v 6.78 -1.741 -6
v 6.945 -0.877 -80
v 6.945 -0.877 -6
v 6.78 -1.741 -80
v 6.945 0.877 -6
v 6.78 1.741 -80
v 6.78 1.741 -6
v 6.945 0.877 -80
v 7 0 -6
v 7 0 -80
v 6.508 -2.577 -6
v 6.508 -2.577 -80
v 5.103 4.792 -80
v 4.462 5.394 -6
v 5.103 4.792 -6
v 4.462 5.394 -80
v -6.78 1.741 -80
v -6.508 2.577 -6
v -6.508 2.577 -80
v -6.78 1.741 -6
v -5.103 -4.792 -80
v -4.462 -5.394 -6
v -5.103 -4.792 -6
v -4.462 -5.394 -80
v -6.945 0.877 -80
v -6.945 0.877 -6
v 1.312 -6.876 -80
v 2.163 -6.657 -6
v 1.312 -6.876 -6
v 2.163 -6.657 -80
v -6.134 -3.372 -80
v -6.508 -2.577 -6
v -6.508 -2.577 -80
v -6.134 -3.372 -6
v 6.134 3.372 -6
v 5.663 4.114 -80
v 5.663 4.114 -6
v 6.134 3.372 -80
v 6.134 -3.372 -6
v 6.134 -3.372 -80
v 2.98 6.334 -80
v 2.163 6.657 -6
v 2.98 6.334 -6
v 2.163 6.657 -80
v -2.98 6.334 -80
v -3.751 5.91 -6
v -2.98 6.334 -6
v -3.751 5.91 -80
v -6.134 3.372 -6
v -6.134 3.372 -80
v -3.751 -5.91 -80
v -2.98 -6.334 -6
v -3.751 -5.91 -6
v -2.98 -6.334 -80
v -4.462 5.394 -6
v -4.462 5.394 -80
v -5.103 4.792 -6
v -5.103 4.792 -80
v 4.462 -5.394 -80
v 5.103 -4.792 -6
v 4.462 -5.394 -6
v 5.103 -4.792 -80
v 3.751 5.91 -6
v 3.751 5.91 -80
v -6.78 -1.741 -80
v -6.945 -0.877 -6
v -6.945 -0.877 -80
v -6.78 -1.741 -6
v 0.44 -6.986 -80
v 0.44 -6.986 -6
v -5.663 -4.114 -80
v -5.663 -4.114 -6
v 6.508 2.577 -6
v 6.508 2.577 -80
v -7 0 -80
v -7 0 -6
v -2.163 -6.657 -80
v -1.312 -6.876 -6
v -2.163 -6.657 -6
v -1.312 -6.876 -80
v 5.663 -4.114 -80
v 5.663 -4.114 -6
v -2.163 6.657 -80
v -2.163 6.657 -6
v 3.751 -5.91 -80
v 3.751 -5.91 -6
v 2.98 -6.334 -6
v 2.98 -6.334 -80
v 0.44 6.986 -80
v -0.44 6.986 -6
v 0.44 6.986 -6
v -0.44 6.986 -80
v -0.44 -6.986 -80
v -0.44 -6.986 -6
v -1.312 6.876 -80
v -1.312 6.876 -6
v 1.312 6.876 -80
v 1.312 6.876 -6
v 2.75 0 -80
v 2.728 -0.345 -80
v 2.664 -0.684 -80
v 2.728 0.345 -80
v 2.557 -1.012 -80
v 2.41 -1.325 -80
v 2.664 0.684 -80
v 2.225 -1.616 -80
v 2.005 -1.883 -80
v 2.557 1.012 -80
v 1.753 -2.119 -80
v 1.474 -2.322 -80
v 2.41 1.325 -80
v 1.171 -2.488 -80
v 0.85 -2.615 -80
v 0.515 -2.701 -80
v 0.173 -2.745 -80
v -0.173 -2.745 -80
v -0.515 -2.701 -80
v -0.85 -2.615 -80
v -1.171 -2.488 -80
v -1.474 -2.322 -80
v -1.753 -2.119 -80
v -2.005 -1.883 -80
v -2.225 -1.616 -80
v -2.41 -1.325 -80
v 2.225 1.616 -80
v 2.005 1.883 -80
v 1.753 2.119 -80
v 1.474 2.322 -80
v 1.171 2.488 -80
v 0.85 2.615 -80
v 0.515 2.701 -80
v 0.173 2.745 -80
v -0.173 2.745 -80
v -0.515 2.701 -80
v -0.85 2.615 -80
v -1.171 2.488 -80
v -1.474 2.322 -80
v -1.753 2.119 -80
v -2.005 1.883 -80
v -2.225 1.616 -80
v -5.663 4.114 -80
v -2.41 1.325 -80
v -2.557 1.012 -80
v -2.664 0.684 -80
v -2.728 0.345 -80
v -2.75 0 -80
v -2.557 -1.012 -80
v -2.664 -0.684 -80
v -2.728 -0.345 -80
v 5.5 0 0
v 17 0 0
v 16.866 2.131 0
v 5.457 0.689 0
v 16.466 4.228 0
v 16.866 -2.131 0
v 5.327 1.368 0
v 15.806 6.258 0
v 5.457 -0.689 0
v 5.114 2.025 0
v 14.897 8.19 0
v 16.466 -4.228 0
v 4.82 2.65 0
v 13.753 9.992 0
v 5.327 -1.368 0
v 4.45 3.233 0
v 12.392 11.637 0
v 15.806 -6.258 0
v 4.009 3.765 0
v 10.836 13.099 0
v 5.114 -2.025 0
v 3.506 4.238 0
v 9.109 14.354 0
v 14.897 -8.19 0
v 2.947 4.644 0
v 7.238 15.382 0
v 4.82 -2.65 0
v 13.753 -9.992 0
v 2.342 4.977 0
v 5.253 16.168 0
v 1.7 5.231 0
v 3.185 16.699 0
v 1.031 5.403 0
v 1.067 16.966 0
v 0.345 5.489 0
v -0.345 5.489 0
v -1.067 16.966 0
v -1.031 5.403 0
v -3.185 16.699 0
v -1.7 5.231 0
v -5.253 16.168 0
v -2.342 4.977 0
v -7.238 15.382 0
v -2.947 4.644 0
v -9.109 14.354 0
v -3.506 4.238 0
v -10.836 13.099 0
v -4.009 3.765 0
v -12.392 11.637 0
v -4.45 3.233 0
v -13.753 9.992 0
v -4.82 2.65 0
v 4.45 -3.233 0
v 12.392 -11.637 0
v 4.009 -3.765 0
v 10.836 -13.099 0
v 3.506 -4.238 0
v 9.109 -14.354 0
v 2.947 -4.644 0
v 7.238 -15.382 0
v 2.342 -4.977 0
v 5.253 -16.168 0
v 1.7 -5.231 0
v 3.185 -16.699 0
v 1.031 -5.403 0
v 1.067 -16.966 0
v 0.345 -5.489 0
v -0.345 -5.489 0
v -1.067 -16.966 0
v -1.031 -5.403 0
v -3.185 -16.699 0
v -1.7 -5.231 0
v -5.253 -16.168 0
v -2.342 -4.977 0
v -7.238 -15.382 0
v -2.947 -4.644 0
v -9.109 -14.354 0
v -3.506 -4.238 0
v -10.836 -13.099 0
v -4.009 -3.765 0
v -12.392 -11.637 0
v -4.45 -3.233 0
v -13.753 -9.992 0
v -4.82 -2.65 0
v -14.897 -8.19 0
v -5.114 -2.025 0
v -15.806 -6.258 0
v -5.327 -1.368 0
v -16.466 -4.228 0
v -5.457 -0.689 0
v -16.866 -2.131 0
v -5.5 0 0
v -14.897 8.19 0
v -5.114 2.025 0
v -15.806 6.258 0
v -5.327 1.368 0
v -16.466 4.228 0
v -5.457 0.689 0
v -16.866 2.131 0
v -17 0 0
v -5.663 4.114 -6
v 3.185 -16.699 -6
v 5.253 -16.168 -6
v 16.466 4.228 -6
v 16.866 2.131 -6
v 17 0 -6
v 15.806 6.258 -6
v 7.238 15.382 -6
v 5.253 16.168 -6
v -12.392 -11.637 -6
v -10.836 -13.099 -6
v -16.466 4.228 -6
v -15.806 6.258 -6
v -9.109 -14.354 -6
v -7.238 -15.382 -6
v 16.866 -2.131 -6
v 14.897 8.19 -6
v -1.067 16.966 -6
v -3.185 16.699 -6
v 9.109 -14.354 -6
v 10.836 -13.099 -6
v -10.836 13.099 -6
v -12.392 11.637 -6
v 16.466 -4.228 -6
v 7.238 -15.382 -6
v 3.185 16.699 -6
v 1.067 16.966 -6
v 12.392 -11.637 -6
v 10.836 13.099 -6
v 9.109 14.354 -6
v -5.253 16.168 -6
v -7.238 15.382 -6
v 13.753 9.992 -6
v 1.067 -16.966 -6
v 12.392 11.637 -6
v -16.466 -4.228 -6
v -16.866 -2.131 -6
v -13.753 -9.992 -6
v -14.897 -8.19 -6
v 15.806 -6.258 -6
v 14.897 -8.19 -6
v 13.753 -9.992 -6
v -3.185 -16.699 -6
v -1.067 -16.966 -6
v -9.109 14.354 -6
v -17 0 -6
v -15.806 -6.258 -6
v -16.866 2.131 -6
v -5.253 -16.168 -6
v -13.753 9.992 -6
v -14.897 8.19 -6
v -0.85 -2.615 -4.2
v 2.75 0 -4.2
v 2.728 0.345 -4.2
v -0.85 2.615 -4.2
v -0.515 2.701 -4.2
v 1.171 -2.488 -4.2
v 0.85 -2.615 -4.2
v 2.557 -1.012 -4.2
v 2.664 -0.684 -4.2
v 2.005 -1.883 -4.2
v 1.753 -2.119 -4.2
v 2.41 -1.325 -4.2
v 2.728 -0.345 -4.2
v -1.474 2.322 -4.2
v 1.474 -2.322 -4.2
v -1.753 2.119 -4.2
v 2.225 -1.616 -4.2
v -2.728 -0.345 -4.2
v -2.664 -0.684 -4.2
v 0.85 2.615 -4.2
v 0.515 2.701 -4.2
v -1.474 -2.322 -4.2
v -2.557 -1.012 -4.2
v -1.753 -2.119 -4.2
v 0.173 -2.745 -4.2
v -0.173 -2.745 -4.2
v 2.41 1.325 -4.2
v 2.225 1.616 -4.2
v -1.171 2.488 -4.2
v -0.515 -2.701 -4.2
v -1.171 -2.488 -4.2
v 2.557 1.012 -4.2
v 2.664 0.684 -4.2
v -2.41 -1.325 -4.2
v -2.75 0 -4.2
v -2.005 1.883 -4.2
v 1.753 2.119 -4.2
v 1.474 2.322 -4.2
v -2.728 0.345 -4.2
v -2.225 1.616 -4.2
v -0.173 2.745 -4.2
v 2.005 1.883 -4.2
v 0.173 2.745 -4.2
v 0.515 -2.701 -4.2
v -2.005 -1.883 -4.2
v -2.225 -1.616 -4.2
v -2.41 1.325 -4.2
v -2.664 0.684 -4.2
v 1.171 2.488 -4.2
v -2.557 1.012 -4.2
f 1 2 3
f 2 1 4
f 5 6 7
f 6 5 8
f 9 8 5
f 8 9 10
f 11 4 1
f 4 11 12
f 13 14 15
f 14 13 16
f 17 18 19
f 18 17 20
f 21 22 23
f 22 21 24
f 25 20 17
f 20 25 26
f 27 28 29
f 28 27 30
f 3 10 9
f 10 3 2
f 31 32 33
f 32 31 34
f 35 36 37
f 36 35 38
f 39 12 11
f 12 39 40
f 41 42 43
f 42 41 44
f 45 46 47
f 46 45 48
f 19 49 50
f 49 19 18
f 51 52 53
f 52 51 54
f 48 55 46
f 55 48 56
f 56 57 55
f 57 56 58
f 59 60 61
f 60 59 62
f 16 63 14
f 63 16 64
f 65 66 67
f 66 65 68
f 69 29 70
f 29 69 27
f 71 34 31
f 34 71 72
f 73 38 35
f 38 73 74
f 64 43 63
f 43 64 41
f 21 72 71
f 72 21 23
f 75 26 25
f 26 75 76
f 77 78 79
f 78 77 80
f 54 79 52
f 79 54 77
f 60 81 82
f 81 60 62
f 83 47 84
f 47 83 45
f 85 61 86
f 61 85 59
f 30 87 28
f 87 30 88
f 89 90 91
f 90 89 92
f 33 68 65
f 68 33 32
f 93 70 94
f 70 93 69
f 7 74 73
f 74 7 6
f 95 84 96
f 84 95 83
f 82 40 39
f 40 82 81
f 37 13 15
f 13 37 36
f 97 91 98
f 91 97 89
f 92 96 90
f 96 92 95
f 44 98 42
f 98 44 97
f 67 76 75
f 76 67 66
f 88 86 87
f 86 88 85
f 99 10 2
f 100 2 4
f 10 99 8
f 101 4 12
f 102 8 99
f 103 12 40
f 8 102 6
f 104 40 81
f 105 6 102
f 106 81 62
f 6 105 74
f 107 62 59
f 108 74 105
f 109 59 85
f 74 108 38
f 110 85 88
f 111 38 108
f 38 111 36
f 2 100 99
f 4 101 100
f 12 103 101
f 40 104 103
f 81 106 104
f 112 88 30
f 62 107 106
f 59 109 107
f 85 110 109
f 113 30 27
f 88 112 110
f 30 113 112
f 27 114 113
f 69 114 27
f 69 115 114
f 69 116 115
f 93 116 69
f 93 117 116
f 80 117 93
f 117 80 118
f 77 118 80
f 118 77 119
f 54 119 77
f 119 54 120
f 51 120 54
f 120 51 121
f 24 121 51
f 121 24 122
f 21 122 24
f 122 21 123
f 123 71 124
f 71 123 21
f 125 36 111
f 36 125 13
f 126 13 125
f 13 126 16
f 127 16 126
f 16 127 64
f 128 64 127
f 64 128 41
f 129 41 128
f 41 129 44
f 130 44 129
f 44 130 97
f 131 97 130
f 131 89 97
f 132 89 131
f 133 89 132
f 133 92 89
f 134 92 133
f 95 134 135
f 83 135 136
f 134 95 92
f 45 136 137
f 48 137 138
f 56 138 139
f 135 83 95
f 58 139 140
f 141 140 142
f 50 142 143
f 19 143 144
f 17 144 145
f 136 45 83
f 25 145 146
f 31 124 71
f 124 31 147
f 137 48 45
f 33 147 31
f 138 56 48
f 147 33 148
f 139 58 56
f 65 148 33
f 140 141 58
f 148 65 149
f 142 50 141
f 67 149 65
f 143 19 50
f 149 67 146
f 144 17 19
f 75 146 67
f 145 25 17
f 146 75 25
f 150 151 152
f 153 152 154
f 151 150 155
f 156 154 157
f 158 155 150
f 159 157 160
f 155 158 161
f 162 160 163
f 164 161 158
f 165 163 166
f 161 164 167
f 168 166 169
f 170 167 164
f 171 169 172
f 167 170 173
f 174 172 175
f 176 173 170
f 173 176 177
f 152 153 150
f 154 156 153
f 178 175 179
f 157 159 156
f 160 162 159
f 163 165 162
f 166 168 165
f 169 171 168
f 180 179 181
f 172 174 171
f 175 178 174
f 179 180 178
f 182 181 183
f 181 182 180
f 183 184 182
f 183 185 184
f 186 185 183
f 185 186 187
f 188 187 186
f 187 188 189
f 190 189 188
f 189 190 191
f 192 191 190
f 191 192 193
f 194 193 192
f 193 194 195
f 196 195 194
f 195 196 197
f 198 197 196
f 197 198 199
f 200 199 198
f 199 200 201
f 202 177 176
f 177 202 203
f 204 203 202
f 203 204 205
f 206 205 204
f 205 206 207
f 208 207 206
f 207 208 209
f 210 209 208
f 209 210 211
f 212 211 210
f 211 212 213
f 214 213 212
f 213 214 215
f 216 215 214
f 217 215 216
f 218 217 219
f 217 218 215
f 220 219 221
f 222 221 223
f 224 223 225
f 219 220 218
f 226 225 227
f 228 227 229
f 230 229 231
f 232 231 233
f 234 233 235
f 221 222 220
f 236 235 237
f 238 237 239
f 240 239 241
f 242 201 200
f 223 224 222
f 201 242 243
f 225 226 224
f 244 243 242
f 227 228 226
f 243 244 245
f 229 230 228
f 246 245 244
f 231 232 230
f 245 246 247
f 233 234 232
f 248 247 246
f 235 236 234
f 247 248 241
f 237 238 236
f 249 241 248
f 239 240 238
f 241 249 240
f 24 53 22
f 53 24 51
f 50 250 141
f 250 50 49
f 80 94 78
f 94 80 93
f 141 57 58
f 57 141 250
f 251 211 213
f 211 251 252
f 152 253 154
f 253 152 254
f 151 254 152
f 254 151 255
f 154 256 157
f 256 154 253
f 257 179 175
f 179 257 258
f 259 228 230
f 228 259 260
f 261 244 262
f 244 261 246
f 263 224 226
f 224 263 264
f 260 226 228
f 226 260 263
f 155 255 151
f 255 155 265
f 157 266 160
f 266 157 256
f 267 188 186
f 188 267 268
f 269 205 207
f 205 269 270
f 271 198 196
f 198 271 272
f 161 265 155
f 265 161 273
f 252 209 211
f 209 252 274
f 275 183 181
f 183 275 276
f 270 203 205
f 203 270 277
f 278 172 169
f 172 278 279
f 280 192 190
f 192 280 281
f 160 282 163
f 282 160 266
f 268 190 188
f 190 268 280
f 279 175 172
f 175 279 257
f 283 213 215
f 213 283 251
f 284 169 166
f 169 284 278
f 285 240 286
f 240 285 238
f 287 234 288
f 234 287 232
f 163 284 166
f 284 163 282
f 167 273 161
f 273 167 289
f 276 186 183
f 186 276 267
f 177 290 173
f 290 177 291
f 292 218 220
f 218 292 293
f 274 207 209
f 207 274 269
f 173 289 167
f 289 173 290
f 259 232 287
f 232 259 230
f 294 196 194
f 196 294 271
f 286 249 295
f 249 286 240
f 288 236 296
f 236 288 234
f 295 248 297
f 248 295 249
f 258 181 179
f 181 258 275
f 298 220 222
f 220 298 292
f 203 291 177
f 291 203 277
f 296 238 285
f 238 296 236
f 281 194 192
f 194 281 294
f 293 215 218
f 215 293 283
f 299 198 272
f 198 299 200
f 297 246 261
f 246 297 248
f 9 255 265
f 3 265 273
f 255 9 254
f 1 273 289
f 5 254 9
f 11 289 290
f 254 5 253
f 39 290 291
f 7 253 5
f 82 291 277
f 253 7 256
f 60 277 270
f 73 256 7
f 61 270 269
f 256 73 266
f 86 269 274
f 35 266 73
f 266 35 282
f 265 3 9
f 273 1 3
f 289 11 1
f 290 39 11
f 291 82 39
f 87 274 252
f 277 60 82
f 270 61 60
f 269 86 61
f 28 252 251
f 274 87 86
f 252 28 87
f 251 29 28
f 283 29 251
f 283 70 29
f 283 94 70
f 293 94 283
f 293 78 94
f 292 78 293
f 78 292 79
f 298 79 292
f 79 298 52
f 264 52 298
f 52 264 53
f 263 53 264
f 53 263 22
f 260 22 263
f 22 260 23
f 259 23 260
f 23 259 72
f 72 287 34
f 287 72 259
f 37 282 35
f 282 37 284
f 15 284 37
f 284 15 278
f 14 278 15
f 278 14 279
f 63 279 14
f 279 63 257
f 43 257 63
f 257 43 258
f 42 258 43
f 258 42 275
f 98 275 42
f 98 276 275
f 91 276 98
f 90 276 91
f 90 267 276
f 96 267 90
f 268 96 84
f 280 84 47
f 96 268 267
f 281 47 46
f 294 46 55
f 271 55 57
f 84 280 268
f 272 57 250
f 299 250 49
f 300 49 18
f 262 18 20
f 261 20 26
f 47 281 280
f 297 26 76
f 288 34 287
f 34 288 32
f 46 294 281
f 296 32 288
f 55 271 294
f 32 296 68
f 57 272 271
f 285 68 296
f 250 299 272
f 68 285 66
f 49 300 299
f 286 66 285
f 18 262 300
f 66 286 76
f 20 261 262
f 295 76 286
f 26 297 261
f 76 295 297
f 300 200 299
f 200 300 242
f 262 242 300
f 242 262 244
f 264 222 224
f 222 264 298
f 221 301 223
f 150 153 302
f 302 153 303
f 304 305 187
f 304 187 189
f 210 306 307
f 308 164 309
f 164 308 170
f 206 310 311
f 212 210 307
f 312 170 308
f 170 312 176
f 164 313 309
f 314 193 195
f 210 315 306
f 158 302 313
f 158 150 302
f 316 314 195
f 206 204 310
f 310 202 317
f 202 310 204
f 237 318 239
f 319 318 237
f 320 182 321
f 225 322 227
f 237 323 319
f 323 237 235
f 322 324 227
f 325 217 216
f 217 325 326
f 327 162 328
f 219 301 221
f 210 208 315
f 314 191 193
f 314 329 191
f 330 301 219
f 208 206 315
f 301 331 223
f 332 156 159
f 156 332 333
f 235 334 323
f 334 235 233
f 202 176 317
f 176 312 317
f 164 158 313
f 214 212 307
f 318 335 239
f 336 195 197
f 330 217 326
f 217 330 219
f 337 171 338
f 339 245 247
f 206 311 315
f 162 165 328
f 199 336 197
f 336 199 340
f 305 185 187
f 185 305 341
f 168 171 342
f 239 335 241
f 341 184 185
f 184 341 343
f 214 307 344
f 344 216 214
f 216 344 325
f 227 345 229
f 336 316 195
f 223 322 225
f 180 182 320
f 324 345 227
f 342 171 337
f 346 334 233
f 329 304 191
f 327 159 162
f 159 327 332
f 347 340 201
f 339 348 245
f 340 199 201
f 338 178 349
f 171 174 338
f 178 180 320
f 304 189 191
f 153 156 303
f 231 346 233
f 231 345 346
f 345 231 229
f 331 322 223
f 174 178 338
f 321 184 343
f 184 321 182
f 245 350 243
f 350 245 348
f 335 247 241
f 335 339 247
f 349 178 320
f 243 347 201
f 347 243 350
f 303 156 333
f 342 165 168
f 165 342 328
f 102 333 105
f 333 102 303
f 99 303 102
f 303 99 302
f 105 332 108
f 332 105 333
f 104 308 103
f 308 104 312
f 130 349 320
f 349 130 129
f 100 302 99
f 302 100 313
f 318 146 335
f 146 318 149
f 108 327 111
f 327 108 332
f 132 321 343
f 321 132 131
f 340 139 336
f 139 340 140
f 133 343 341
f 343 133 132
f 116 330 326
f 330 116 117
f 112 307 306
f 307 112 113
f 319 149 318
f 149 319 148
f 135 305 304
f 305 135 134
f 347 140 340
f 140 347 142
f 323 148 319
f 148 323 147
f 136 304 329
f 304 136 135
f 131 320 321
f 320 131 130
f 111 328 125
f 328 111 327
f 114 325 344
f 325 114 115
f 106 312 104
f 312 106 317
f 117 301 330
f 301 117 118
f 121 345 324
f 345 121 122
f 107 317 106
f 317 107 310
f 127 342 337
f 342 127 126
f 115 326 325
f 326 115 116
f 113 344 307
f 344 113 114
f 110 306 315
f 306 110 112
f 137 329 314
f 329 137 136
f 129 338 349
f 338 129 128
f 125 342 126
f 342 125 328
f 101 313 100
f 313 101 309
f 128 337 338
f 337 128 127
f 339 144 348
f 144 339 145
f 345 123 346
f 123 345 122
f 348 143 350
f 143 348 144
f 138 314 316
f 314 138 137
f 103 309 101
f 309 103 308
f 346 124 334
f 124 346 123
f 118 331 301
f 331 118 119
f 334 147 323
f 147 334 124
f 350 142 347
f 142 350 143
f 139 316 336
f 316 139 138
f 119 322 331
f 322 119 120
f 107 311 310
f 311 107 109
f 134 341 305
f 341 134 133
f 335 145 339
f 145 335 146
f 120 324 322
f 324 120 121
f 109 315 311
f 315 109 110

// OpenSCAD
$fn = 50;


difference() {
	union() {
		translate(v = [0, 0, -80.0000000000]) {
			cylinder(h = 80, r = 7.0000000000);
		}
		translate(v = [0, 0, -6.0000000000]) {
			cylinder(h = 6, r = 17.0000000000);
		}
	}
	union() {
		translate(v = [0, 0, 0]) {
			rotate(a = [0, 0, 0]) {
				difference() {
					union() {
						#translate(v = [0, 0, -80.0000000000]) {
							cylinder(h = 80, r = 2.2500000000);
						}
						#translate(v = [0, 0, -4.2000000000]) {
							cylinder(h = 4.2000000000, r = 7.0000000000, r1 = 2.7500000000, r2 = 5.5000000000);
						}
						#translate(v = [0, 0, -80.0000000000]) {
							cylinder(h = 80, r = 2.7500000000);
						}
						#translate(v = [0, 0, -80.0000000000]) {
							cylinder(h = 80, r = 2.2500000000);
						}
					}
					union();
				}
			}
		}
	}
}
